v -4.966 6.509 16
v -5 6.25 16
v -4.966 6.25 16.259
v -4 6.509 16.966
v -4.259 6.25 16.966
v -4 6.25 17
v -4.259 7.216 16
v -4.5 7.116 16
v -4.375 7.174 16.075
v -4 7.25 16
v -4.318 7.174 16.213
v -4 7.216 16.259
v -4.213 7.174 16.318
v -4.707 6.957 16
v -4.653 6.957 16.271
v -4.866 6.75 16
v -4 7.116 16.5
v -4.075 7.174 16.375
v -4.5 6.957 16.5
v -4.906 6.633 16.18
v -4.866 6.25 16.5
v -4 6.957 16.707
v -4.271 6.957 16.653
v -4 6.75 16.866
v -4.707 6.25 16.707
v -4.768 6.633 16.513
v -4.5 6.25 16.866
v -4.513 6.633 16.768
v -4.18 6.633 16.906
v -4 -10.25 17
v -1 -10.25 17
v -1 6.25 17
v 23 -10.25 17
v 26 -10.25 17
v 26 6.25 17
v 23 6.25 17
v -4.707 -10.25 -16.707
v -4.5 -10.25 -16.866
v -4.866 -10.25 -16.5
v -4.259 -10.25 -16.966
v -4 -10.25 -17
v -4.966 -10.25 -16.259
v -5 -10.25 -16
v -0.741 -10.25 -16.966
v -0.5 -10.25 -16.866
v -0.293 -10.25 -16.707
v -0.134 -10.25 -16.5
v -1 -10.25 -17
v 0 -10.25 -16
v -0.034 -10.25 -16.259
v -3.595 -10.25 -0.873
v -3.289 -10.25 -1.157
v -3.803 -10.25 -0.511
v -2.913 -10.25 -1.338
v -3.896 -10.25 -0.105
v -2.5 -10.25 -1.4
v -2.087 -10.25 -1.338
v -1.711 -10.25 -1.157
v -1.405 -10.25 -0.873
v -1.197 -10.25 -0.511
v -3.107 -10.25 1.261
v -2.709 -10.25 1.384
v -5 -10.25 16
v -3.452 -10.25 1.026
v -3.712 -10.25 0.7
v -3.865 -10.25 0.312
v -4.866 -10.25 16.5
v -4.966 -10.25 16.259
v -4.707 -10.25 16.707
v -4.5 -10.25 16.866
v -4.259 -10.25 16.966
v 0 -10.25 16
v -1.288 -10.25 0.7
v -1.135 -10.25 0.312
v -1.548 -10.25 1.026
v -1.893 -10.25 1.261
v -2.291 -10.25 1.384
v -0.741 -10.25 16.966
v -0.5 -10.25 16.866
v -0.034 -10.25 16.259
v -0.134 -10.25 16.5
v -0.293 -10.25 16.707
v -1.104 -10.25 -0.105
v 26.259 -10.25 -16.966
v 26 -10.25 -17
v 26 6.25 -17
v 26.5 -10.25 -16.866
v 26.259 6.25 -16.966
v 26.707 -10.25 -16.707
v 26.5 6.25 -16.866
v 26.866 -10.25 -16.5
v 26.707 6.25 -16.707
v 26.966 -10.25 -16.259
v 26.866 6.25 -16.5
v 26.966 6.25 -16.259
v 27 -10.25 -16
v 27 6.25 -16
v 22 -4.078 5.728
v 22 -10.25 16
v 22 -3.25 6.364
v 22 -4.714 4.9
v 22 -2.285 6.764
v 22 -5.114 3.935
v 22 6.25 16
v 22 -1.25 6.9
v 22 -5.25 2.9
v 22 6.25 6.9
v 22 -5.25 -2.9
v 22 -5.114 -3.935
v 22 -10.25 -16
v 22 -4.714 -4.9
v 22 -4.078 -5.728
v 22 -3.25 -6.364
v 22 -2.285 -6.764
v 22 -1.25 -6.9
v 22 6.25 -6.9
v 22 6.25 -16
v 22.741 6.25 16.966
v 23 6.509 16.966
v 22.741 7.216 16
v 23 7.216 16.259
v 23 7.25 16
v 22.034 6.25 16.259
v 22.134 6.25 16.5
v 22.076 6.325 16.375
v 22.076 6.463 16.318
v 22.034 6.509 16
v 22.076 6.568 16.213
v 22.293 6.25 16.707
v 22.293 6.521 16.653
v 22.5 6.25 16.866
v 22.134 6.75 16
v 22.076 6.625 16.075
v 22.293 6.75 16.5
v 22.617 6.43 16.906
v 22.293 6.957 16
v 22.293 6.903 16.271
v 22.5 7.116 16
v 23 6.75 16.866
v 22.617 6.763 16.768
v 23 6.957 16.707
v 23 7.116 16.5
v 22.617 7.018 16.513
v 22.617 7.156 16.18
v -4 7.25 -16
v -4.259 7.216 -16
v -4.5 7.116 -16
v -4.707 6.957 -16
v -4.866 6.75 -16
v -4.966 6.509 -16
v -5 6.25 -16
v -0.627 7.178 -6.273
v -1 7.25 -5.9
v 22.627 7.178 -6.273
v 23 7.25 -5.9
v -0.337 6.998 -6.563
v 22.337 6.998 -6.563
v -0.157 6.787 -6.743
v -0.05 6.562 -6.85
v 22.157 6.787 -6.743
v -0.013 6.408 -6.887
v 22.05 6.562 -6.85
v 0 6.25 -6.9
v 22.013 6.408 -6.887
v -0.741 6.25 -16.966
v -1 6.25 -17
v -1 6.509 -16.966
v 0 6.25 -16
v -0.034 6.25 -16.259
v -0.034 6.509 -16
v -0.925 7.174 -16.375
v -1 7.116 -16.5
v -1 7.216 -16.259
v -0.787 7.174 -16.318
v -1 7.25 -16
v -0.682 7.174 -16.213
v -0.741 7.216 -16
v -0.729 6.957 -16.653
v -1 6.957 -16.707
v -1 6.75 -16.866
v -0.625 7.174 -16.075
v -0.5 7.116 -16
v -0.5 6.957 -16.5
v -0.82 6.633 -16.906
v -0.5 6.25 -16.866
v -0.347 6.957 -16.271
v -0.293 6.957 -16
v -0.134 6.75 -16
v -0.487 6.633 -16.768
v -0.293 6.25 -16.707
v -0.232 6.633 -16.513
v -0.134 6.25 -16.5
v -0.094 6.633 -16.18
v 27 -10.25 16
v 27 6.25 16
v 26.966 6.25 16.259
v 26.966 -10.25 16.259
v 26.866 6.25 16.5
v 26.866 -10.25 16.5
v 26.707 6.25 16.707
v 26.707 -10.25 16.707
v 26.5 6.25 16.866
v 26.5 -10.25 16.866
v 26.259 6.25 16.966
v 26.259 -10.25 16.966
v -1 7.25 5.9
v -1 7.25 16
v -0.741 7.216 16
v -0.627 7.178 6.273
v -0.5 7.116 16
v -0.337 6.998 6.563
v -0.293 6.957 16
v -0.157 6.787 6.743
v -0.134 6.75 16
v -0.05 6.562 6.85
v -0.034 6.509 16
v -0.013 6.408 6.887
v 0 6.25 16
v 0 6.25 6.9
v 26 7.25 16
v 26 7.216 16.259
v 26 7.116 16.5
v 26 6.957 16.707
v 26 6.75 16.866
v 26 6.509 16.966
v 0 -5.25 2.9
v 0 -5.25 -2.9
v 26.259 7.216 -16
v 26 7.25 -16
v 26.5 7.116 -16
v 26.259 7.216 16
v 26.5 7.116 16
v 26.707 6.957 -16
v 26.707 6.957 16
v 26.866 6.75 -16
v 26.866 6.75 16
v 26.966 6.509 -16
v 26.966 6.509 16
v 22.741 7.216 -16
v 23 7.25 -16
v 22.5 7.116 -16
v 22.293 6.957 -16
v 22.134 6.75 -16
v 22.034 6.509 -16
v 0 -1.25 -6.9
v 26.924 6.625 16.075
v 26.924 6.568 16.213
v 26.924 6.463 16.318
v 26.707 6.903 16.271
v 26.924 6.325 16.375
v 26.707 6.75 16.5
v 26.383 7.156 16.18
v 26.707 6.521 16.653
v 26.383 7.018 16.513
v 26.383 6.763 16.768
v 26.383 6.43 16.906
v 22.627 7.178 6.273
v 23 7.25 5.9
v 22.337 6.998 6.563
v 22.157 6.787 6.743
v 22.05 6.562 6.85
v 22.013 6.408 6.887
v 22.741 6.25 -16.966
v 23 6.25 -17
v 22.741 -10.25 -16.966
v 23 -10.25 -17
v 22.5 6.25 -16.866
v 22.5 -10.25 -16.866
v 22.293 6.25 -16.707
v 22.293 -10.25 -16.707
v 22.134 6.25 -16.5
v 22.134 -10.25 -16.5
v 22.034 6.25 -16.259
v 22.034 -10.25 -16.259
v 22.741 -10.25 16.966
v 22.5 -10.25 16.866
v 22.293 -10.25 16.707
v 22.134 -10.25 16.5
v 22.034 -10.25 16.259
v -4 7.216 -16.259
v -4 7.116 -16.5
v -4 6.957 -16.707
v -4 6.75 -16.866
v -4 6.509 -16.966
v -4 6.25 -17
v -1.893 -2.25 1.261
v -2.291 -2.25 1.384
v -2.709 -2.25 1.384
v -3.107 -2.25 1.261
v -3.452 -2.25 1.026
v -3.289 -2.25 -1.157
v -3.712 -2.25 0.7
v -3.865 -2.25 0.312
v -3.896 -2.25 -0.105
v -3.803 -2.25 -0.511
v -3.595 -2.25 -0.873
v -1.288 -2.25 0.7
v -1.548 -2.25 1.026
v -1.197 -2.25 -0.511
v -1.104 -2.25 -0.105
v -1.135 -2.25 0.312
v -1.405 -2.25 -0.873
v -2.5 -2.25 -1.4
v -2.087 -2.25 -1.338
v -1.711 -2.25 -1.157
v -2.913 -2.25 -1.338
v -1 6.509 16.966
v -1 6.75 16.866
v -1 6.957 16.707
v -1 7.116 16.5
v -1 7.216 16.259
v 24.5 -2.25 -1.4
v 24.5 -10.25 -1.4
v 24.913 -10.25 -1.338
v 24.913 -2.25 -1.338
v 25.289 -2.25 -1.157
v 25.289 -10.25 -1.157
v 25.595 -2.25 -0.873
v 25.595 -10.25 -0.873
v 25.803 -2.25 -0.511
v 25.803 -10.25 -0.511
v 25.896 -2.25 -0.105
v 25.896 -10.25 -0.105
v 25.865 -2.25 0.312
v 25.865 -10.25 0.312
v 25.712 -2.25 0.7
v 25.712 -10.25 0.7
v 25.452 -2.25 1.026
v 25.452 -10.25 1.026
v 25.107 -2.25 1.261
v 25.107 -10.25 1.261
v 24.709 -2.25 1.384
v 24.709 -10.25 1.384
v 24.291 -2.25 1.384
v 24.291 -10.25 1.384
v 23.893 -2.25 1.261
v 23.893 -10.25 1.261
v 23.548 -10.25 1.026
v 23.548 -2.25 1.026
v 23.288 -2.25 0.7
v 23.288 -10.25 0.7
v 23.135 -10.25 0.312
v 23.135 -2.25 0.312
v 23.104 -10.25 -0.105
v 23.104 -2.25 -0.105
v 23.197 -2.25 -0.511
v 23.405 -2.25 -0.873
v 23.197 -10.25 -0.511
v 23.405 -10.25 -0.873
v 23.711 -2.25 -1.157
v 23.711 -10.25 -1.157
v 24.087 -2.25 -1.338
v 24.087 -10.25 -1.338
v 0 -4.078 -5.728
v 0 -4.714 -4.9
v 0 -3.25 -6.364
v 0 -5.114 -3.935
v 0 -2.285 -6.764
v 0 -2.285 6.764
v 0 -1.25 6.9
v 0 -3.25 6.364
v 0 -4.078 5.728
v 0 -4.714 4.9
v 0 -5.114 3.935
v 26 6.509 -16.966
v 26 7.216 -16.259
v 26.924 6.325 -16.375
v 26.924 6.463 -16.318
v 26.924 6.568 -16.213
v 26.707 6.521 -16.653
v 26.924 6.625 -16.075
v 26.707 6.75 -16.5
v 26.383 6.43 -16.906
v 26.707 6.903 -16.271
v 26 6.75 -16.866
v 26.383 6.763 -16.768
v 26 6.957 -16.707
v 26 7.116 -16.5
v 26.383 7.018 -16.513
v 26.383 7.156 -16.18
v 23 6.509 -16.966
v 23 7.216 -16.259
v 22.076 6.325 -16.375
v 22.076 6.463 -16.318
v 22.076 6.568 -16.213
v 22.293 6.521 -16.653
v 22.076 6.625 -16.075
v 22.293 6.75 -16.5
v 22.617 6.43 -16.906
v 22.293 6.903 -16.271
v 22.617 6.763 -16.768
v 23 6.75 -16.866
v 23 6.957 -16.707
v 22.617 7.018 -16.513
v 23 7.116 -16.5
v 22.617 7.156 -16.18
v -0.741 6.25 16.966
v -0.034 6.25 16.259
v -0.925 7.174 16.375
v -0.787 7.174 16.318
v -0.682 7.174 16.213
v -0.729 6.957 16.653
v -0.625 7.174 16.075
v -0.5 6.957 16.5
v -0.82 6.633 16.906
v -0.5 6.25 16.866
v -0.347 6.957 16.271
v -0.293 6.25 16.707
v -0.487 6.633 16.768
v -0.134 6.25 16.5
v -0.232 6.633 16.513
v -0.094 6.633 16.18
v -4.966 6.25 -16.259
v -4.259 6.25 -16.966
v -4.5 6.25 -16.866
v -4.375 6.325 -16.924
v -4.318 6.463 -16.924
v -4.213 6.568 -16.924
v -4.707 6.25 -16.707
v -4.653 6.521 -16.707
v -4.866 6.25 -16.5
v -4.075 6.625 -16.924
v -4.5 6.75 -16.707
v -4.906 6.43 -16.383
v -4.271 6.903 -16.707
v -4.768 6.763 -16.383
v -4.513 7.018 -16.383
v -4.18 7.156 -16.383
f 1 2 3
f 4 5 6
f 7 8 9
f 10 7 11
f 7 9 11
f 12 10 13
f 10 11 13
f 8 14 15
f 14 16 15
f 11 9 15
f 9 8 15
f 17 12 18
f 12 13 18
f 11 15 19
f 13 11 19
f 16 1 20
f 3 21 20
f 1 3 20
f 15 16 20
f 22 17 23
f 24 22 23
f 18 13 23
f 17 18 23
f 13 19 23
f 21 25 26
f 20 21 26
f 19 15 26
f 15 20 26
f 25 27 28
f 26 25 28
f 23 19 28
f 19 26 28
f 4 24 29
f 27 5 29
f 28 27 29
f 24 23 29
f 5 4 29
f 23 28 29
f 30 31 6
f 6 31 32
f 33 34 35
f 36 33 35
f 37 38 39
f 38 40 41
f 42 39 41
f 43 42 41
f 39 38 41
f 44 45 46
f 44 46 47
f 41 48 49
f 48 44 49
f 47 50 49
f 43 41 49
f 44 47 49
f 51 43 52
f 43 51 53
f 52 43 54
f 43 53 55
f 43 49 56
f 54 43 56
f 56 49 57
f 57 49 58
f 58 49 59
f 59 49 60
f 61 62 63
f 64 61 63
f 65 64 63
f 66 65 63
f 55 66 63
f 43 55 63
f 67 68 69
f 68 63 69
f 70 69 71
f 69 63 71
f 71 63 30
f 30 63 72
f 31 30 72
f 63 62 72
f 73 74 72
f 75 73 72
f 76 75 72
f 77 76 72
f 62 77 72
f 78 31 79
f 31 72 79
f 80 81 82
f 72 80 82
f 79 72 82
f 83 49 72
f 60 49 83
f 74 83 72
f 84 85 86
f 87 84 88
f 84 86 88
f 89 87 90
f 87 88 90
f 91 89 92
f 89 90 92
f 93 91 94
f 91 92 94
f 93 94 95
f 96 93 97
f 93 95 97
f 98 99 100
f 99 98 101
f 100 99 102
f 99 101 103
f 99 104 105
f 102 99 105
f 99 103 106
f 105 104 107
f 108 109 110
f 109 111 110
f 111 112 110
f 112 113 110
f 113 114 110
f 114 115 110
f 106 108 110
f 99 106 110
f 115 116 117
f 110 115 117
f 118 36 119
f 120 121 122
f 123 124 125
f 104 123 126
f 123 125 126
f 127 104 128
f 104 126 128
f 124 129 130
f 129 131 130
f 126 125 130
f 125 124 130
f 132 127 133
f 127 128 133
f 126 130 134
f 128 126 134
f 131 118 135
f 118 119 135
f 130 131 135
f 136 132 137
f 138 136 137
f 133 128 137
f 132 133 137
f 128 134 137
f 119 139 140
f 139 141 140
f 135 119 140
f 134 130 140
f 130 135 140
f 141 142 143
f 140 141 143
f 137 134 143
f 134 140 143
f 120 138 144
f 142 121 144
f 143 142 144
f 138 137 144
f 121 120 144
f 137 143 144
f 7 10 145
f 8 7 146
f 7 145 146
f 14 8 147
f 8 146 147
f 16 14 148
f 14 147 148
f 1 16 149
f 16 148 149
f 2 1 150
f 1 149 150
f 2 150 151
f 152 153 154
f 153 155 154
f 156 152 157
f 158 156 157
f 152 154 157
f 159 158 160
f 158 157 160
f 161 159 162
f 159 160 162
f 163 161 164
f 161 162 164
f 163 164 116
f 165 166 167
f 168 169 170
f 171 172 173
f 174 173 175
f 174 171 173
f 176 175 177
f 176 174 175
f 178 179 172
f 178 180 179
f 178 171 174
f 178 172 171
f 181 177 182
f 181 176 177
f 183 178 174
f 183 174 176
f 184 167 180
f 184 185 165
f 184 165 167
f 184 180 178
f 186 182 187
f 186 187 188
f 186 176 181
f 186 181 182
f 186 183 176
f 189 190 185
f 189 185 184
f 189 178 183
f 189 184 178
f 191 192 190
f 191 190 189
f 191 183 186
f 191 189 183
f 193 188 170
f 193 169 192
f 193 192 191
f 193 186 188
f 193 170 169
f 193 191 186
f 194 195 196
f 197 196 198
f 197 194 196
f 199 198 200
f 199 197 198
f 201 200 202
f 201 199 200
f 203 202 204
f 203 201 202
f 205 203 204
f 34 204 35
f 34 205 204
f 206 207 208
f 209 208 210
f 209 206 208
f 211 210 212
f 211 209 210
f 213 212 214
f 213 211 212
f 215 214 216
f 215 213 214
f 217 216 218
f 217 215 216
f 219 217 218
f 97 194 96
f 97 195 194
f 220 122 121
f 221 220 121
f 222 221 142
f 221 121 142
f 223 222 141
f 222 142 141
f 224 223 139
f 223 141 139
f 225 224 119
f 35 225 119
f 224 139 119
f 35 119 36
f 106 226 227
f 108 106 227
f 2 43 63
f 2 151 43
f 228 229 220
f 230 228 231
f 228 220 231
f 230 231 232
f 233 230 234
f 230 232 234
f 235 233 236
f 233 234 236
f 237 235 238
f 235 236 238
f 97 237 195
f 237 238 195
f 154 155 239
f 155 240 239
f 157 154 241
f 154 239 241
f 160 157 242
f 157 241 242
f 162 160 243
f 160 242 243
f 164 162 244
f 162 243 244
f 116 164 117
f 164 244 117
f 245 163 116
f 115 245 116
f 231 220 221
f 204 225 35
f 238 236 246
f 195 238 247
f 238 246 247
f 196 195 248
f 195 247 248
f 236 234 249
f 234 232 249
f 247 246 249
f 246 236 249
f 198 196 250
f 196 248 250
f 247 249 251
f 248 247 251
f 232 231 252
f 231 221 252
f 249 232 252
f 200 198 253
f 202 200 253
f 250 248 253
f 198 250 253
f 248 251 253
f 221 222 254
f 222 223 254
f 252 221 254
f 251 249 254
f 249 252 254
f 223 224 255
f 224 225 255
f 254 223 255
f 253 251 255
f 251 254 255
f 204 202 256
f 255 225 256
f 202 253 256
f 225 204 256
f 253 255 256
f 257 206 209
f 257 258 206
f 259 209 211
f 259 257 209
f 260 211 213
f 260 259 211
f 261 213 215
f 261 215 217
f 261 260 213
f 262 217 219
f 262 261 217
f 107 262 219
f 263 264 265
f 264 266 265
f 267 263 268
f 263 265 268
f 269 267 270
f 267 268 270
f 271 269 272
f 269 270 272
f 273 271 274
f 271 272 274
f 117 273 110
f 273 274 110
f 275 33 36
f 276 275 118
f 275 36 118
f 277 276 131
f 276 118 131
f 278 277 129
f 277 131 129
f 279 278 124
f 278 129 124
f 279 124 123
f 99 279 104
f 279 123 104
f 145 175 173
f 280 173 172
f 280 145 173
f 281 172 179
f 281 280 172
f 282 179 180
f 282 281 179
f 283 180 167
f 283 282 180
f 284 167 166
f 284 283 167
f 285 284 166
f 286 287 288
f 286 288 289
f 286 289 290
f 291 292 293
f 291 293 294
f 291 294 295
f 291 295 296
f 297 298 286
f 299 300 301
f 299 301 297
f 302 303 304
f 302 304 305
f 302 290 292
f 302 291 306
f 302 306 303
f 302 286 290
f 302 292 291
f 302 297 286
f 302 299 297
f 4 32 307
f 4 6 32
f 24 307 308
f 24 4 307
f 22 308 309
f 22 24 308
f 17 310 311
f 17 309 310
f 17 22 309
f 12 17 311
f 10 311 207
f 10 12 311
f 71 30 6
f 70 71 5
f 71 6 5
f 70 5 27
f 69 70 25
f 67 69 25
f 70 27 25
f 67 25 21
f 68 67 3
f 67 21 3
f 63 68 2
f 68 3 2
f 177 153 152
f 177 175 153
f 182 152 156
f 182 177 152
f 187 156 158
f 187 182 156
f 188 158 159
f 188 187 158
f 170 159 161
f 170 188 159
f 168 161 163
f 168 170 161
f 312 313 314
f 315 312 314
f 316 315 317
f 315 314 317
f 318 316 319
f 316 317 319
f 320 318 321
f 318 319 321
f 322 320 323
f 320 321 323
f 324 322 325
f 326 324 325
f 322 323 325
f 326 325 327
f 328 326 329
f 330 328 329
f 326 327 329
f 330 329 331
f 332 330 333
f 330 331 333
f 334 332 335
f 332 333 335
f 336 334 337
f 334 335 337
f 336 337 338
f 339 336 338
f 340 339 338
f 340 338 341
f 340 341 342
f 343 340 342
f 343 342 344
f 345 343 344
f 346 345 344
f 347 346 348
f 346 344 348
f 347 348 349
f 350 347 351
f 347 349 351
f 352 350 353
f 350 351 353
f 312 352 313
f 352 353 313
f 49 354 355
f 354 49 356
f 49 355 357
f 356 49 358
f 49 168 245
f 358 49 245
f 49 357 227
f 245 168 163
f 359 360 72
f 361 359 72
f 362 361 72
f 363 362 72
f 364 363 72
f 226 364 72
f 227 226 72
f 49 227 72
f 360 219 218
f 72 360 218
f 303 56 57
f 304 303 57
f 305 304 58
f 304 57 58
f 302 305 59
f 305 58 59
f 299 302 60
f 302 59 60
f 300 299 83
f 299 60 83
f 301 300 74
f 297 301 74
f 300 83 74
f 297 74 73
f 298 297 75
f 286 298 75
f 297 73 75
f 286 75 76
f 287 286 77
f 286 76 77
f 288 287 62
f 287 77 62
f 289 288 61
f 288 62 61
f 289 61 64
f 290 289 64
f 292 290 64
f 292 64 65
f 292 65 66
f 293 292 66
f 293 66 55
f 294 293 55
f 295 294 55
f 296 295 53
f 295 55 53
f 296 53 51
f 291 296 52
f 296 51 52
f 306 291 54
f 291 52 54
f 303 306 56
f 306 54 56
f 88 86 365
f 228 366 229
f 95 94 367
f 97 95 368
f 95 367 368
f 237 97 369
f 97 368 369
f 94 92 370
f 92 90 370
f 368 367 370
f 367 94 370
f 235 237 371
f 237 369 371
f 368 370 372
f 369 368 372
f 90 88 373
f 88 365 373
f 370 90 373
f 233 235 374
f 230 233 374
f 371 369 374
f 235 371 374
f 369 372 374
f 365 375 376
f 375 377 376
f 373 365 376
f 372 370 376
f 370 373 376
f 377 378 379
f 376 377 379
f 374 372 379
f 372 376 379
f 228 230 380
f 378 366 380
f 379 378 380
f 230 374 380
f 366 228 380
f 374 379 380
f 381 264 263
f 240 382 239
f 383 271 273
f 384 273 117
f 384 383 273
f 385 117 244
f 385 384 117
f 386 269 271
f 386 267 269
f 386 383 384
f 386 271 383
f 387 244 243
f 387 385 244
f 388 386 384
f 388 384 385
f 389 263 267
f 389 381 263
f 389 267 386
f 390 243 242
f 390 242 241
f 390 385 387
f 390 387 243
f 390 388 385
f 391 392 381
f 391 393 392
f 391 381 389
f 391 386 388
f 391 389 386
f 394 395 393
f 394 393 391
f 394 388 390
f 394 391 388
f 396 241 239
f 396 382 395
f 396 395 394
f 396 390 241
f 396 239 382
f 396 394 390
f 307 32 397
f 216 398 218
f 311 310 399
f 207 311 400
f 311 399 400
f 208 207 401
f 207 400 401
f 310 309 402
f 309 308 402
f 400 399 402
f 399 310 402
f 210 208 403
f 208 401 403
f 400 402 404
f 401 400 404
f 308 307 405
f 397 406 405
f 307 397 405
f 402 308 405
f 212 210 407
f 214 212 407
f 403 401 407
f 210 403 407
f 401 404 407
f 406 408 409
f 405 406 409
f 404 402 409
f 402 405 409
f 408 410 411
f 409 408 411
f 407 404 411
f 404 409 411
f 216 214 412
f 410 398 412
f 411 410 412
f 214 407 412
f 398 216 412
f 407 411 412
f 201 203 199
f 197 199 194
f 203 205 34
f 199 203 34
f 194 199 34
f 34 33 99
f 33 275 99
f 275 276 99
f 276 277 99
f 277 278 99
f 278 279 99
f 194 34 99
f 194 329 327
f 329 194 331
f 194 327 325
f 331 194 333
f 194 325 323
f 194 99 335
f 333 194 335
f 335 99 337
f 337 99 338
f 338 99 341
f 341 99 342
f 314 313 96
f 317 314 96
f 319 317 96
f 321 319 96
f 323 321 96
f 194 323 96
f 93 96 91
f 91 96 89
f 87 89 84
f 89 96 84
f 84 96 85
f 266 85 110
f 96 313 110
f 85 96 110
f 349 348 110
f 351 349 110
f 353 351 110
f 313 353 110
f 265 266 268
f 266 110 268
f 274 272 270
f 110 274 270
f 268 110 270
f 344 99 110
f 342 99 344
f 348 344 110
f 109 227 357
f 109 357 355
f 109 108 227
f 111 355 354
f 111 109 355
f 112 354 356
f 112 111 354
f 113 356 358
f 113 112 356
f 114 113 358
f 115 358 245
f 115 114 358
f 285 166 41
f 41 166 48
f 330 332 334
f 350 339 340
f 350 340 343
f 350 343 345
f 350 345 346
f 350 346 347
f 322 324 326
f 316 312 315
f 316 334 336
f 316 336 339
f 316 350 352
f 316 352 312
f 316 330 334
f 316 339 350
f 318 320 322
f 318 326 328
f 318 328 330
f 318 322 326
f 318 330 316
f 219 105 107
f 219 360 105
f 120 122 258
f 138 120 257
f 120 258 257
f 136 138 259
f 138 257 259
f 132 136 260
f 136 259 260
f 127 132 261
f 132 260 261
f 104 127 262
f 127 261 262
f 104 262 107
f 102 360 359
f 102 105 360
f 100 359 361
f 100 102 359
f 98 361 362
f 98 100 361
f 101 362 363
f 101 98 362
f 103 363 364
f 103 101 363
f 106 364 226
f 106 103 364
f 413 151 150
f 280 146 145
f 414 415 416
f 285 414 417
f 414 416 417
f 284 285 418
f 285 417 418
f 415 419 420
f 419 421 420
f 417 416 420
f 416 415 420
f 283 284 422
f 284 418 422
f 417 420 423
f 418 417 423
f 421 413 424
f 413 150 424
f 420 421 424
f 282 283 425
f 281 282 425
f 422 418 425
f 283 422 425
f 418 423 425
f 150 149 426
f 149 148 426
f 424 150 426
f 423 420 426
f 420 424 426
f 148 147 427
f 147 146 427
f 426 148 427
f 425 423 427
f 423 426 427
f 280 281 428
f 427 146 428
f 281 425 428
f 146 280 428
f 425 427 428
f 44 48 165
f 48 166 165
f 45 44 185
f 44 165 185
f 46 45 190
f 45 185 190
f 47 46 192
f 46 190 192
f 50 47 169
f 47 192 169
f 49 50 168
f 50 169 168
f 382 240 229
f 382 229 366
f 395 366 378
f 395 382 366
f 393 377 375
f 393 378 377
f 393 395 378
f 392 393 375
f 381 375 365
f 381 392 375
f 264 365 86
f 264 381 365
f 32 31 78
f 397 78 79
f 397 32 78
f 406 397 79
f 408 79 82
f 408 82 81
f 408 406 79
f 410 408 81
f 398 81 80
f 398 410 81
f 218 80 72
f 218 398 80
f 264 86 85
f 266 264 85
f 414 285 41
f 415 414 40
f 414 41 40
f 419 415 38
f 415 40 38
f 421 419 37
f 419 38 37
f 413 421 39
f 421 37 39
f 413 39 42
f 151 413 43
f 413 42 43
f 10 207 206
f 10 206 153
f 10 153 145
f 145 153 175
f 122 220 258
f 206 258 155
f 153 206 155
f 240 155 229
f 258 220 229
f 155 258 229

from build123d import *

# Parameters (mm, degrees)
SKETCH1_W           = 13.8
SKETCH1_H           = 10.5
BOSS_EXTRUDE1_DEPTH = 22
BOSS_EXTRUDE2_DEPTH = 5
BOSS_EXTRUDE3_DEPTH = 5
SKETCH4_R           = 1.4
CUT_EXTRUDE1_DEPTH  = 8
SKETCH5_W           = 22
SKETCH5_H           = 10.1
CUT_EXTRUDE2_DEPTH  = 37.390245946
FILLET2_R           = 1
FILLET3_R           = 4


with BuildPart() as part:
    # Sketch1 → Boss-Extrude1 (new body)
    with BuildSketch(Plane(origin=(0, 0, 0), x_dir=(0, 0, -1), z_dir=(1, 0, 0))):
        Polygon((6.9, 5.25), (17, 5.25), (17, 7.25), (-17, 7.25), (-17, 5.25), (-6.9, 5.25), align=None)
        Rectangle(SKETCH1_W, SKETCH1_H)
    extrude(amount=BOSS_EXTRUDE1_DEPTH)

    # Sketch2 → Boss-Extrude2 (add)
    with BuildSketch(Plane(origin=(22, 0, 0), x_dir=(0, 0, -1), z_dir=(1, 0, 0))):
        Polygon((-6.9, 5.25), (-17, 5.25), (-17, -10.25), (17, -10.25), (17, 5.25), (6.9, 5.25), (6.9, -5.25), (-6.9, -5.25), align=None)
        Polygon((-17, 7.25), (-17, 5.25), (-6.9, 5.25), (-6.9, -5.25), (6.9, -5.25), (6.9, 5.25), (17, 5.25), (17, 7.25), align=None)
    extrude(amount=BOSS_EXTRUDE2_DEPTH)

    # Sketch3 → Boss-Extrude3 (add)
    with BuildSketch(Plane.ZY):
        Polygon((17, -10.25), (17, 5.25), (6.9, 5.25), (6.9, -5.25), (-6.9, -5.25), (-6.9, 5.25), (-17, 5.25), (-17, -10.25), align=None)
        Polygon((6.9, -5.25), (6.9, 5.25), (17, 5.25), (17, 7.25), (-17, 7.25), (-17, 5.25), (-6.9, 5.25), (-6.9, -5.25), align=None)
    extrude(amount=BOSS_EXTRUDE3_DEPTH)

    # Sketch4 → Cut-Extrude1 (cut)
    with BuildSketch(Plane.XZ.offset(10.25)):
        with Locations(Location((-2.5, 0, 0), (0, 0, 270))):
            Circle(SKETCH4_R)
        with Locations(Location((24.5, 0, 0), (0, 0, 270))):
            Circle(SKETCH4_R)
    extrude(amount=-CUT_EXTRUDE1_DEPTH, mode=Mode.SUBTRACT)

    # Sketch5 → Cut-Extrude2 (cut, through all)
    with BuildSketch(Plane(origin=(0, 7.25, 0), x_dir=(1, 0, 0), z_dir=(0, 1, 0))):
        with Locations((11, -11.95)):
            Rectangle(SKETCH5_W, SKETCH5_H)
        with Locations((11, 11.95)):
            Rectangle(SKETCH5_W, SKETCH5_H)
    extrude(amount=-CUT_EXTRUDE2_DEPTH, mode=Mode.SUBTRACT)

    # Fillet2
    fillet2_edges = [part.edges().sort_by_distance(p)[0] for p in [
        (24.5, 7.25, 17),
        (24.5, 7.25, -17),
        (22, -1.5, -17),
        (27, -1.5, -17),
        (22, -1.5, 17),
        (27, 7.25, 0),
        (27, -1.5, 17),
        (-5, -1.5, 17),
        (0, -1.5, -17),
        (-5, 7.25, 0),
        (-5, -1.5, -17),
        (0, -1.5, 17),
        (-2.5, 7.25, 17),
        (-2.5, 7.25, -17),
        (22, 7.25, 11.95),
        (11, 7.25, 6.9),
        (0, 7.25, 11.95),
        (11, 7.25, -6.9),
        (22, 7.25, -11.95),
        (0, 7.25, -11.95),
    ]]
    fillet(fillet2_edges, radius=FILLET2_R)

    # Fillet3
    fillet3_edges = [part.edges().sort_by_distance(p)[0] for p in [
        (11, -5.25, -6.9),
        (11, -5.25, 6.9),
    ]]
    fillet(fillet3_edges, radius=FILLET3_R)


solid = part.part
